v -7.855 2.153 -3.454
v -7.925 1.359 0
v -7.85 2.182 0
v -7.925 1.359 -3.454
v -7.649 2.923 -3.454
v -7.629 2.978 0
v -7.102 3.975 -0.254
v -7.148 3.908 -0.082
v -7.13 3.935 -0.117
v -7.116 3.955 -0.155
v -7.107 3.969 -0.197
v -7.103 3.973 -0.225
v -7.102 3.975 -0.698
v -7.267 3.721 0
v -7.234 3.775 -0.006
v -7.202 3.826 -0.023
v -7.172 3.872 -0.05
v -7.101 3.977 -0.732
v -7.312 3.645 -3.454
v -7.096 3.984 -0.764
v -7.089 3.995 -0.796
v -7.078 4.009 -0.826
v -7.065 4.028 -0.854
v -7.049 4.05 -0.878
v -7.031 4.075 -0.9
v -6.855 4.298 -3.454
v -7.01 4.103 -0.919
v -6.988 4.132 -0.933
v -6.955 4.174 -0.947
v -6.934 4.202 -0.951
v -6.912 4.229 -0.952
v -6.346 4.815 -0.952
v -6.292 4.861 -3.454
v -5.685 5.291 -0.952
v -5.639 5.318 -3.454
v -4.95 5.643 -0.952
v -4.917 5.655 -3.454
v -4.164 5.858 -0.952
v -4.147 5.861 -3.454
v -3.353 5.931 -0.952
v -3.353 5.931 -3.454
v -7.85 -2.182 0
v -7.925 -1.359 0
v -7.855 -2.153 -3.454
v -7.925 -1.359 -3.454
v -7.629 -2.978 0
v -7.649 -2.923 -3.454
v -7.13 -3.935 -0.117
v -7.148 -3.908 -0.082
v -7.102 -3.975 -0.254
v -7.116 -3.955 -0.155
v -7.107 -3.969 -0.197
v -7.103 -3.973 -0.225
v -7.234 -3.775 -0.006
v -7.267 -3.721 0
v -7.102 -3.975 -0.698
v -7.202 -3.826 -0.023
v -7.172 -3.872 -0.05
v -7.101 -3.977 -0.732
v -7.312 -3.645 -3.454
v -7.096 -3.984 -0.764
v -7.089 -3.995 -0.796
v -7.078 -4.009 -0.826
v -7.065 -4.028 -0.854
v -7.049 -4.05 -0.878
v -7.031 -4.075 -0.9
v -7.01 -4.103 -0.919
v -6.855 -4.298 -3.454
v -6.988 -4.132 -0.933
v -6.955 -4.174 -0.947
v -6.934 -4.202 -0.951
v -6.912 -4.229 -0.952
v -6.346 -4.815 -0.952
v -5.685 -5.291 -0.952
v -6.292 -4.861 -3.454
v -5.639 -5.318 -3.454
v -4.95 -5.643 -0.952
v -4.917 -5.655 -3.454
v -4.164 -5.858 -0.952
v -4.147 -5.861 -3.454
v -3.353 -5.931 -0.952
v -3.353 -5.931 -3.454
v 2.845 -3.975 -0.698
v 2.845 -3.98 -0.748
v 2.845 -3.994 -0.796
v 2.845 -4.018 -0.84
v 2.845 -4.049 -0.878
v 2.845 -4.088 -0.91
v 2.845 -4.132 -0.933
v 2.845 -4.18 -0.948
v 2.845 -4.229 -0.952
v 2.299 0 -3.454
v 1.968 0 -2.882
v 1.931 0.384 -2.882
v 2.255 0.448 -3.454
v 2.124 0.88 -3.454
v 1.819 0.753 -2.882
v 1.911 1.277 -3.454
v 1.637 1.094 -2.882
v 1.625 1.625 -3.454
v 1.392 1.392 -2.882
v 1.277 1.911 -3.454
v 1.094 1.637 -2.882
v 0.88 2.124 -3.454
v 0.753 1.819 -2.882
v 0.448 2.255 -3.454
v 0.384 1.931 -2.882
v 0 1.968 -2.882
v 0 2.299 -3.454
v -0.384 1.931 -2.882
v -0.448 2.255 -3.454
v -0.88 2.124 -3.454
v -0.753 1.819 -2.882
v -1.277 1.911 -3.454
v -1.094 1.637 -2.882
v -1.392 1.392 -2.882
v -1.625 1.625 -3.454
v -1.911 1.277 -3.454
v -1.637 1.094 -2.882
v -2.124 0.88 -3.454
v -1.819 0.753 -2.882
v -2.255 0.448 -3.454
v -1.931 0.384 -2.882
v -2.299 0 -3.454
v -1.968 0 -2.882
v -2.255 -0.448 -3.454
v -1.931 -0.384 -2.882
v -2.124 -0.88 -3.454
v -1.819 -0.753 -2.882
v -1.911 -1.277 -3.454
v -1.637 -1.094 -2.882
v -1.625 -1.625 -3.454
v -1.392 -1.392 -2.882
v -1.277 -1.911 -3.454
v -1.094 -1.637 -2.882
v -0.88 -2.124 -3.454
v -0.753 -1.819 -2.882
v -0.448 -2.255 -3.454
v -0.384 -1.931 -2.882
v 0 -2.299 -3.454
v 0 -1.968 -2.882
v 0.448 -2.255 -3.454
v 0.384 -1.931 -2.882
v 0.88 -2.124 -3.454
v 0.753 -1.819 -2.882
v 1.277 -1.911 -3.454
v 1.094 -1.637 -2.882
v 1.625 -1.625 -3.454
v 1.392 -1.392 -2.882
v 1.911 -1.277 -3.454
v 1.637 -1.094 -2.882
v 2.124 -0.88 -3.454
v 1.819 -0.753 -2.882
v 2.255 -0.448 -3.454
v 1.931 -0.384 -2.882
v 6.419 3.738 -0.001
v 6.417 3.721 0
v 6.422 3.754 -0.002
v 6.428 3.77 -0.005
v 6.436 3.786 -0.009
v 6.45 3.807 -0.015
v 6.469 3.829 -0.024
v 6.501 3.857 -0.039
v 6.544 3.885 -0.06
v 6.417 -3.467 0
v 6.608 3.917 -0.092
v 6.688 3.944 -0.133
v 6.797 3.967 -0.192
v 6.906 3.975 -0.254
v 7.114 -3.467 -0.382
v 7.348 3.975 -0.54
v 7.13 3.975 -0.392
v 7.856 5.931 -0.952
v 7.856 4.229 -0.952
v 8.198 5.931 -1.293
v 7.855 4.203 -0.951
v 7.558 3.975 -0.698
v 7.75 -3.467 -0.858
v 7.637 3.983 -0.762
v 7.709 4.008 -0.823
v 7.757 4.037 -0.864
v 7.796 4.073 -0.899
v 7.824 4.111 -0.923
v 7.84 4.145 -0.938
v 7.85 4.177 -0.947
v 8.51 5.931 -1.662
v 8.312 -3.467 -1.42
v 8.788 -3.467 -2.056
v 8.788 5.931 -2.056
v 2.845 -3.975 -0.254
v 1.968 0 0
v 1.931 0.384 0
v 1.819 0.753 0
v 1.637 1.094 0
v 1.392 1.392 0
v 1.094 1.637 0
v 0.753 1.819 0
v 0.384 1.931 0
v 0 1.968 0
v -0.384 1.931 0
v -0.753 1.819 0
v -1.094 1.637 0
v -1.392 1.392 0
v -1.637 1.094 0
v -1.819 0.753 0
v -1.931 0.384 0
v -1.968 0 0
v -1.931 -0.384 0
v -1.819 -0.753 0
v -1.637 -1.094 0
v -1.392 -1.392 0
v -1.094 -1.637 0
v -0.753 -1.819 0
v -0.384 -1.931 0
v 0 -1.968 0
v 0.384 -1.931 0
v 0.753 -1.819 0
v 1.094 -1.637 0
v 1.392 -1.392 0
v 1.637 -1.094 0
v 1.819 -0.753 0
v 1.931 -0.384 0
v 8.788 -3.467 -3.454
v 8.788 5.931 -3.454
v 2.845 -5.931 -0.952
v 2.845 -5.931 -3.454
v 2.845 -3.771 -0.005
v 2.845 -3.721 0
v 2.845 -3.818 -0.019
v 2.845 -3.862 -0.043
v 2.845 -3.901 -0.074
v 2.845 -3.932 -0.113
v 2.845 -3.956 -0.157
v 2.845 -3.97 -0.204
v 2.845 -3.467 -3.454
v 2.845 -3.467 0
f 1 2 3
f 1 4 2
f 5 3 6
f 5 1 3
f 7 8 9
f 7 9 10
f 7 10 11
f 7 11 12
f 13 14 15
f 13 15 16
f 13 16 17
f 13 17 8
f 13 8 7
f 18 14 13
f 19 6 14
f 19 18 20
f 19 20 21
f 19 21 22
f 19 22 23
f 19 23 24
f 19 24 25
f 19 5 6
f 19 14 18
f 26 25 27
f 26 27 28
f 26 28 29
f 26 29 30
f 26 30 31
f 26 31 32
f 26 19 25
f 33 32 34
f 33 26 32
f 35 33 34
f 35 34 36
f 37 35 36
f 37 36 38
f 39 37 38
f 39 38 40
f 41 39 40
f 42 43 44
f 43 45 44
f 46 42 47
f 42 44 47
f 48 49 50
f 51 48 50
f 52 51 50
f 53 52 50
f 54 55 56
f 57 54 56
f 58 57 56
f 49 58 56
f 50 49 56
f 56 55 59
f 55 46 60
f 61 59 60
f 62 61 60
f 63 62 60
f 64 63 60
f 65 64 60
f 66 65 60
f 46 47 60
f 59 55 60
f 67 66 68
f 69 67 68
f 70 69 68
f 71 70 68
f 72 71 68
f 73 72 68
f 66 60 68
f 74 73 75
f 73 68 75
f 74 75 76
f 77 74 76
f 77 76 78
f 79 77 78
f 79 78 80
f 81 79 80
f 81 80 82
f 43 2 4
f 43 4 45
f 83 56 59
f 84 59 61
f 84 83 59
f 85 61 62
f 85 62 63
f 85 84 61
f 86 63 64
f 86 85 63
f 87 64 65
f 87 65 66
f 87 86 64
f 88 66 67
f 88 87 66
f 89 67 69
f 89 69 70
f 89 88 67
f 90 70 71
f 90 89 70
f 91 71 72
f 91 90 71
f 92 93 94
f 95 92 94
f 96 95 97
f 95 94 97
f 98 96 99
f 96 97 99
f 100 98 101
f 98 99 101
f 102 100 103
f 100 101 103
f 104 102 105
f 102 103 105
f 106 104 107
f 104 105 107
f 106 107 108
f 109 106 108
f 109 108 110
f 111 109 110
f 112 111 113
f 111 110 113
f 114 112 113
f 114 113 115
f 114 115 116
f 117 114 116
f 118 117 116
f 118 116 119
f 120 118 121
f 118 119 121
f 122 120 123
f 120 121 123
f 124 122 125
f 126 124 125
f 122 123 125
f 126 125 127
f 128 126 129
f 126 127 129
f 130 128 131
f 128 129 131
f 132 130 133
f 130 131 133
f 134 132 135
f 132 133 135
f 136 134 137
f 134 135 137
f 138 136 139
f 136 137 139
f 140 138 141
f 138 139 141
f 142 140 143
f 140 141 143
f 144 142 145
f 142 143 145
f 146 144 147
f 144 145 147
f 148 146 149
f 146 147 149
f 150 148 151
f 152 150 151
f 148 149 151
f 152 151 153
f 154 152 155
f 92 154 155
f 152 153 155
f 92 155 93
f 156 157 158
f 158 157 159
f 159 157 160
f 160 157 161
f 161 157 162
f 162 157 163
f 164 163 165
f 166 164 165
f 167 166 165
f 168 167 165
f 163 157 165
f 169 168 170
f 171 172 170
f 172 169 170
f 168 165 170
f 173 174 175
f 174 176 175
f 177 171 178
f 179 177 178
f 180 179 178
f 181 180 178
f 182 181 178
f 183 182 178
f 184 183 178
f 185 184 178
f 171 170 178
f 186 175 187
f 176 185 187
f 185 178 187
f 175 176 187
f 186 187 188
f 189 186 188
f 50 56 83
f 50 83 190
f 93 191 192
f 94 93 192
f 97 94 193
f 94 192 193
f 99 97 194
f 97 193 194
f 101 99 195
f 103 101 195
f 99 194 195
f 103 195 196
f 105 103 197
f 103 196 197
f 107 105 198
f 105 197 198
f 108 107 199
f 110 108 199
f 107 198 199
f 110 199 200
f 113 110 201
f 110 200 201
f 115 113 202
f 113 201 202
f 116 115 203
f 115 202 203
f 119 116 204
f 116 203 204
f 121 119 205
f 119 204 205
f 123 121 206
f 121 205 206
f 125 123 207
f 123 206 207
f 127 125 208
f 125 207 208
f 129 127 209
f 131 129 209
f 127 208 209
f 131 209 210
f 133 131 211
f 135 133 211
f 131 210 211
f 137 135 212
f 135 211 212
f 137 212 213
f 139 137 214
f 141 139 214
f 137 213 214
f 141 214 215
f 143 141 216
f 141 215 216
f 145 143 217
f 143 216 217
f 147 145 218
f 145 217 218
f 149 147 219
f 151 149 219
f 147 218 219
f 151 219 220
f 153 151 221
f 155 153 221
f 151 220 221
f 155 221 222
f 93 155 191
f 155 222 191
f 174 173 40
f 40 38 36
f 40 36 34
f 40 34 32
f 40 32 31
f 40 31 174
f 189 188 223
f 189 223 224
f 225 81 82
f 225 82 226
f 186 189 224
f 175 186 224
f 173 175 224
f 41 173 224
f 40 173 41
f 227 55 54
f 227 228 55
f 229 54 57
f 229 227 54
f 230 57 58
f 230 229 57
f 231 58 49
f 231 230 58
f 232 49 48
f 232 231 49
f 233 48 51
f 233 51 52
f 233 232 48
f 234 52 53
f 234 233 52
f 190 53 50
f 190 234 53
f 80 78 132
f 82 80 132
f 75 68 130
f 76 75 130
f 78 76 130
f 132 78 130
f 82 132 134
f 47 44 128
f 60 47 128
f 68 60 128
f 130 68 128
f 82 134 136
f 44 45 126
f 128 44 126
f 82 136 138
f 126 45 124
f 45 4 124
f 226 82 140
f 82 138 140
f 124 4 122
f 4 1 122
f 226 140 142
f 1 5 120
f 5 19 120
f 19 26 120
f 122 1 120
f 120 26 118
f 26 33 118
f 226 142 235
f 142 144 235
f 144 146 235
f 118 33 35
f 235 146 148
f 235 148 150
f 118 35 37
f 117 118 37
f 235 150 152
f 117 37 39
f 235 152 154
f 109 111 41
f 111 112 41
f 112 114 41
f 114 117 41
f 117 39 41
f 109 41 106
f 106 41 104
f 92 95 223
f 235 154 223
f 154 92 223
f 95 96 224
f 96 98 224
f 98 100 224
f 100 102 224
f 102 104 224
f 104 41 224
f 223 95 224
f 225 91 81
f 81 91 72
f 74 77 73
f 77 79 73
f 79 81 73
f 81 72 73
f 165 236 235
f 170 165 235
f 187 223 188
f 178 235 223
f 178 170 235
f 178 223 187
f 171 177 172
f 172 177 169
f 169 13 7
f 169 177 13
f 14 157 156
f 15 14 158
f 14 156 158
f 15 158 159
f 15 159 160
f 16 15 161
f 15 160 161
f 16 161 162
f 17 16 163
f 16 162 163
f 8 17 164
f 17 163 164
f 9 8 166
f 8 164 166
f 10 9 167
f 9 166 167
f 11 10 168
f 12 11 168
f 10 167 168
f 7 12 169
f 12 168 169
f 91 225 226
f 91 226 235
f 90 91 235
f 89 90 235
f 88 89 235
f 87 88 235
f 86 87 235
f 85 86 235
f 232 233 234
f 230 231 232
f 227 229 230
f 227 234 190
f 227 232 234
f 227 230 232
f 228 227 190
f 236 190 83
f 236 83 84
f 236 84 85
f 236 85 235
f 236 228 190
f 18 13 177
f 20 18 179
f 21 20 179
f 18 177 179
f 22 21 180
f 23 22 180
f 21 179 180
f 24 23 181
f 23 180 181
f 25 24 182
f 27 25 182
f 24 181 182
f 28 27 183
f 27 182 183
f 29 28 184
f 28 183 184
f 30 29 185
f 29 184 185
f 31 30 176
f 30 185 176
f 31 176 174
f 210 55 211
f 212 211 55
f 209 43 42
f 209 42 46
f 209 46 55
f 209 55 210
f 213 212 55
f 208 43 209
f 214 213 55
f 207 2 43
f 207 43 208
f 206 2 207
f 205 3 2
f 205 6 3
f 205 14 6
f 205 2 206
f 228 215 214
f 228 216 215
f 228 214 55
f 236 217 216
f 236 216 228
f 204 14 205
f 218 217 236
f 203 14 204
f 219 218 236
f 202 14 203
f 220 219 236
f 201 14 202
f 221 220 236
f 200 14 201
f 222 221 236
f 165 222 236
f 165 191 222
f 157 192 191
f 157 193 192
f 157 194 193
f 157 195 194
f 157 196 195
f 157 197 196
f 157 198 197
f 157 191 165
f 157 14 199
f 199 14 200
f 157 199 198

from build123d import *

# Parameters (mm, degrees)
F0_R     = 1.9685
F1_DEPTH = 3.4544
F2_W     = 1.9558
F2_H     = 0.9525
F3_DEPTH = 16.7142
F4_R     = 4.572
F6_DEPTH = 9.399
F7_R     = 0.254
F8_SIZE2 = 0.5719231767
F8_SIZE  = 0.3302


with BuildPart() as f1:
    # F0 (on Top) → F1 (new body)
    with BuildSketch(Plane.XY):
        Polygon((-7.9248, 5.9309), (-7.9248, -5.9309), (2.8448, -5.9309), (2.8448, -3.4671), (8.7884, -3.4671), (8.7884, 5.9309), align=None)
        Circle(F0_R, mode=Mode.SUBTRACT)
    extrude(amount=-F1_DEPTH)

    # F2 (on face) → F3 (cut, through all)
    with BuildSketch(Plane(origin=(-7.9248, 0, 0), x_dir=(0, -1, 0), z_dir=(-1, 0, 0))):
        with Locations((-4.953, -0.47625)):
            Rectangle(F2_W, F2_H)
        with Locations((4.953, -0.47625)):
            Rectangle(F2_W, F2_H)
    extrude(amount=-F3_DEPTH, mode=Mode.SUBTRACT)

    # F4
    f4_edges = [f1.edges().sort_by_distance(p)[0] for p in [
        (-7.9248, -5.9309, -2.20345),
        (-7.9248, 5.9309, -2.20345),
    ]]
    fillet(f4_edges, radius=F4_R)

    # F5 (on face) → F6 (cut, through all)
    with BuildSketch(Plane.XZ.offset(3.4671)):
        with BuildLine():
            ThreePointArc((6.417348453, 0), (7.7501634134, -0.858086307), (8.7884, -2.0559062515))
            Line((8.7884, -2.0559062515), (8.7884, 0))
            Line((8.7884, 0), (6.417348453, 0))
        make_face()
    extrude(amount=-F6_DEPTH, mode=Mode.SUBTRACT)

    # F7
    f7_edges = [f1.edges().sort_by_distance(p)[0] for p in [
        (-2.128745, -3.9751, 0),
        (-0.342471, 3.9751, 0),
        (-2.128745, -3.9751, -0.9525),
        (0.377001, 3.9751, -0.9525),
    ]]
    fillet(f7_edges, radius=F7_R)

    # F8
    f8_edges = [f1.edges().sort_by_distance(p)[0] for p in [
        (-1.9685, 0, -3.4544),
    ]]
    f8_side = f1.faces().sort_by_distance((2.7178, 5.725953, -3.4544))[0]
    chamfer(f8_edges, length=F8_SIZE, length2=F8_SIZE2, reference=f8_side)


solid = f1.part
